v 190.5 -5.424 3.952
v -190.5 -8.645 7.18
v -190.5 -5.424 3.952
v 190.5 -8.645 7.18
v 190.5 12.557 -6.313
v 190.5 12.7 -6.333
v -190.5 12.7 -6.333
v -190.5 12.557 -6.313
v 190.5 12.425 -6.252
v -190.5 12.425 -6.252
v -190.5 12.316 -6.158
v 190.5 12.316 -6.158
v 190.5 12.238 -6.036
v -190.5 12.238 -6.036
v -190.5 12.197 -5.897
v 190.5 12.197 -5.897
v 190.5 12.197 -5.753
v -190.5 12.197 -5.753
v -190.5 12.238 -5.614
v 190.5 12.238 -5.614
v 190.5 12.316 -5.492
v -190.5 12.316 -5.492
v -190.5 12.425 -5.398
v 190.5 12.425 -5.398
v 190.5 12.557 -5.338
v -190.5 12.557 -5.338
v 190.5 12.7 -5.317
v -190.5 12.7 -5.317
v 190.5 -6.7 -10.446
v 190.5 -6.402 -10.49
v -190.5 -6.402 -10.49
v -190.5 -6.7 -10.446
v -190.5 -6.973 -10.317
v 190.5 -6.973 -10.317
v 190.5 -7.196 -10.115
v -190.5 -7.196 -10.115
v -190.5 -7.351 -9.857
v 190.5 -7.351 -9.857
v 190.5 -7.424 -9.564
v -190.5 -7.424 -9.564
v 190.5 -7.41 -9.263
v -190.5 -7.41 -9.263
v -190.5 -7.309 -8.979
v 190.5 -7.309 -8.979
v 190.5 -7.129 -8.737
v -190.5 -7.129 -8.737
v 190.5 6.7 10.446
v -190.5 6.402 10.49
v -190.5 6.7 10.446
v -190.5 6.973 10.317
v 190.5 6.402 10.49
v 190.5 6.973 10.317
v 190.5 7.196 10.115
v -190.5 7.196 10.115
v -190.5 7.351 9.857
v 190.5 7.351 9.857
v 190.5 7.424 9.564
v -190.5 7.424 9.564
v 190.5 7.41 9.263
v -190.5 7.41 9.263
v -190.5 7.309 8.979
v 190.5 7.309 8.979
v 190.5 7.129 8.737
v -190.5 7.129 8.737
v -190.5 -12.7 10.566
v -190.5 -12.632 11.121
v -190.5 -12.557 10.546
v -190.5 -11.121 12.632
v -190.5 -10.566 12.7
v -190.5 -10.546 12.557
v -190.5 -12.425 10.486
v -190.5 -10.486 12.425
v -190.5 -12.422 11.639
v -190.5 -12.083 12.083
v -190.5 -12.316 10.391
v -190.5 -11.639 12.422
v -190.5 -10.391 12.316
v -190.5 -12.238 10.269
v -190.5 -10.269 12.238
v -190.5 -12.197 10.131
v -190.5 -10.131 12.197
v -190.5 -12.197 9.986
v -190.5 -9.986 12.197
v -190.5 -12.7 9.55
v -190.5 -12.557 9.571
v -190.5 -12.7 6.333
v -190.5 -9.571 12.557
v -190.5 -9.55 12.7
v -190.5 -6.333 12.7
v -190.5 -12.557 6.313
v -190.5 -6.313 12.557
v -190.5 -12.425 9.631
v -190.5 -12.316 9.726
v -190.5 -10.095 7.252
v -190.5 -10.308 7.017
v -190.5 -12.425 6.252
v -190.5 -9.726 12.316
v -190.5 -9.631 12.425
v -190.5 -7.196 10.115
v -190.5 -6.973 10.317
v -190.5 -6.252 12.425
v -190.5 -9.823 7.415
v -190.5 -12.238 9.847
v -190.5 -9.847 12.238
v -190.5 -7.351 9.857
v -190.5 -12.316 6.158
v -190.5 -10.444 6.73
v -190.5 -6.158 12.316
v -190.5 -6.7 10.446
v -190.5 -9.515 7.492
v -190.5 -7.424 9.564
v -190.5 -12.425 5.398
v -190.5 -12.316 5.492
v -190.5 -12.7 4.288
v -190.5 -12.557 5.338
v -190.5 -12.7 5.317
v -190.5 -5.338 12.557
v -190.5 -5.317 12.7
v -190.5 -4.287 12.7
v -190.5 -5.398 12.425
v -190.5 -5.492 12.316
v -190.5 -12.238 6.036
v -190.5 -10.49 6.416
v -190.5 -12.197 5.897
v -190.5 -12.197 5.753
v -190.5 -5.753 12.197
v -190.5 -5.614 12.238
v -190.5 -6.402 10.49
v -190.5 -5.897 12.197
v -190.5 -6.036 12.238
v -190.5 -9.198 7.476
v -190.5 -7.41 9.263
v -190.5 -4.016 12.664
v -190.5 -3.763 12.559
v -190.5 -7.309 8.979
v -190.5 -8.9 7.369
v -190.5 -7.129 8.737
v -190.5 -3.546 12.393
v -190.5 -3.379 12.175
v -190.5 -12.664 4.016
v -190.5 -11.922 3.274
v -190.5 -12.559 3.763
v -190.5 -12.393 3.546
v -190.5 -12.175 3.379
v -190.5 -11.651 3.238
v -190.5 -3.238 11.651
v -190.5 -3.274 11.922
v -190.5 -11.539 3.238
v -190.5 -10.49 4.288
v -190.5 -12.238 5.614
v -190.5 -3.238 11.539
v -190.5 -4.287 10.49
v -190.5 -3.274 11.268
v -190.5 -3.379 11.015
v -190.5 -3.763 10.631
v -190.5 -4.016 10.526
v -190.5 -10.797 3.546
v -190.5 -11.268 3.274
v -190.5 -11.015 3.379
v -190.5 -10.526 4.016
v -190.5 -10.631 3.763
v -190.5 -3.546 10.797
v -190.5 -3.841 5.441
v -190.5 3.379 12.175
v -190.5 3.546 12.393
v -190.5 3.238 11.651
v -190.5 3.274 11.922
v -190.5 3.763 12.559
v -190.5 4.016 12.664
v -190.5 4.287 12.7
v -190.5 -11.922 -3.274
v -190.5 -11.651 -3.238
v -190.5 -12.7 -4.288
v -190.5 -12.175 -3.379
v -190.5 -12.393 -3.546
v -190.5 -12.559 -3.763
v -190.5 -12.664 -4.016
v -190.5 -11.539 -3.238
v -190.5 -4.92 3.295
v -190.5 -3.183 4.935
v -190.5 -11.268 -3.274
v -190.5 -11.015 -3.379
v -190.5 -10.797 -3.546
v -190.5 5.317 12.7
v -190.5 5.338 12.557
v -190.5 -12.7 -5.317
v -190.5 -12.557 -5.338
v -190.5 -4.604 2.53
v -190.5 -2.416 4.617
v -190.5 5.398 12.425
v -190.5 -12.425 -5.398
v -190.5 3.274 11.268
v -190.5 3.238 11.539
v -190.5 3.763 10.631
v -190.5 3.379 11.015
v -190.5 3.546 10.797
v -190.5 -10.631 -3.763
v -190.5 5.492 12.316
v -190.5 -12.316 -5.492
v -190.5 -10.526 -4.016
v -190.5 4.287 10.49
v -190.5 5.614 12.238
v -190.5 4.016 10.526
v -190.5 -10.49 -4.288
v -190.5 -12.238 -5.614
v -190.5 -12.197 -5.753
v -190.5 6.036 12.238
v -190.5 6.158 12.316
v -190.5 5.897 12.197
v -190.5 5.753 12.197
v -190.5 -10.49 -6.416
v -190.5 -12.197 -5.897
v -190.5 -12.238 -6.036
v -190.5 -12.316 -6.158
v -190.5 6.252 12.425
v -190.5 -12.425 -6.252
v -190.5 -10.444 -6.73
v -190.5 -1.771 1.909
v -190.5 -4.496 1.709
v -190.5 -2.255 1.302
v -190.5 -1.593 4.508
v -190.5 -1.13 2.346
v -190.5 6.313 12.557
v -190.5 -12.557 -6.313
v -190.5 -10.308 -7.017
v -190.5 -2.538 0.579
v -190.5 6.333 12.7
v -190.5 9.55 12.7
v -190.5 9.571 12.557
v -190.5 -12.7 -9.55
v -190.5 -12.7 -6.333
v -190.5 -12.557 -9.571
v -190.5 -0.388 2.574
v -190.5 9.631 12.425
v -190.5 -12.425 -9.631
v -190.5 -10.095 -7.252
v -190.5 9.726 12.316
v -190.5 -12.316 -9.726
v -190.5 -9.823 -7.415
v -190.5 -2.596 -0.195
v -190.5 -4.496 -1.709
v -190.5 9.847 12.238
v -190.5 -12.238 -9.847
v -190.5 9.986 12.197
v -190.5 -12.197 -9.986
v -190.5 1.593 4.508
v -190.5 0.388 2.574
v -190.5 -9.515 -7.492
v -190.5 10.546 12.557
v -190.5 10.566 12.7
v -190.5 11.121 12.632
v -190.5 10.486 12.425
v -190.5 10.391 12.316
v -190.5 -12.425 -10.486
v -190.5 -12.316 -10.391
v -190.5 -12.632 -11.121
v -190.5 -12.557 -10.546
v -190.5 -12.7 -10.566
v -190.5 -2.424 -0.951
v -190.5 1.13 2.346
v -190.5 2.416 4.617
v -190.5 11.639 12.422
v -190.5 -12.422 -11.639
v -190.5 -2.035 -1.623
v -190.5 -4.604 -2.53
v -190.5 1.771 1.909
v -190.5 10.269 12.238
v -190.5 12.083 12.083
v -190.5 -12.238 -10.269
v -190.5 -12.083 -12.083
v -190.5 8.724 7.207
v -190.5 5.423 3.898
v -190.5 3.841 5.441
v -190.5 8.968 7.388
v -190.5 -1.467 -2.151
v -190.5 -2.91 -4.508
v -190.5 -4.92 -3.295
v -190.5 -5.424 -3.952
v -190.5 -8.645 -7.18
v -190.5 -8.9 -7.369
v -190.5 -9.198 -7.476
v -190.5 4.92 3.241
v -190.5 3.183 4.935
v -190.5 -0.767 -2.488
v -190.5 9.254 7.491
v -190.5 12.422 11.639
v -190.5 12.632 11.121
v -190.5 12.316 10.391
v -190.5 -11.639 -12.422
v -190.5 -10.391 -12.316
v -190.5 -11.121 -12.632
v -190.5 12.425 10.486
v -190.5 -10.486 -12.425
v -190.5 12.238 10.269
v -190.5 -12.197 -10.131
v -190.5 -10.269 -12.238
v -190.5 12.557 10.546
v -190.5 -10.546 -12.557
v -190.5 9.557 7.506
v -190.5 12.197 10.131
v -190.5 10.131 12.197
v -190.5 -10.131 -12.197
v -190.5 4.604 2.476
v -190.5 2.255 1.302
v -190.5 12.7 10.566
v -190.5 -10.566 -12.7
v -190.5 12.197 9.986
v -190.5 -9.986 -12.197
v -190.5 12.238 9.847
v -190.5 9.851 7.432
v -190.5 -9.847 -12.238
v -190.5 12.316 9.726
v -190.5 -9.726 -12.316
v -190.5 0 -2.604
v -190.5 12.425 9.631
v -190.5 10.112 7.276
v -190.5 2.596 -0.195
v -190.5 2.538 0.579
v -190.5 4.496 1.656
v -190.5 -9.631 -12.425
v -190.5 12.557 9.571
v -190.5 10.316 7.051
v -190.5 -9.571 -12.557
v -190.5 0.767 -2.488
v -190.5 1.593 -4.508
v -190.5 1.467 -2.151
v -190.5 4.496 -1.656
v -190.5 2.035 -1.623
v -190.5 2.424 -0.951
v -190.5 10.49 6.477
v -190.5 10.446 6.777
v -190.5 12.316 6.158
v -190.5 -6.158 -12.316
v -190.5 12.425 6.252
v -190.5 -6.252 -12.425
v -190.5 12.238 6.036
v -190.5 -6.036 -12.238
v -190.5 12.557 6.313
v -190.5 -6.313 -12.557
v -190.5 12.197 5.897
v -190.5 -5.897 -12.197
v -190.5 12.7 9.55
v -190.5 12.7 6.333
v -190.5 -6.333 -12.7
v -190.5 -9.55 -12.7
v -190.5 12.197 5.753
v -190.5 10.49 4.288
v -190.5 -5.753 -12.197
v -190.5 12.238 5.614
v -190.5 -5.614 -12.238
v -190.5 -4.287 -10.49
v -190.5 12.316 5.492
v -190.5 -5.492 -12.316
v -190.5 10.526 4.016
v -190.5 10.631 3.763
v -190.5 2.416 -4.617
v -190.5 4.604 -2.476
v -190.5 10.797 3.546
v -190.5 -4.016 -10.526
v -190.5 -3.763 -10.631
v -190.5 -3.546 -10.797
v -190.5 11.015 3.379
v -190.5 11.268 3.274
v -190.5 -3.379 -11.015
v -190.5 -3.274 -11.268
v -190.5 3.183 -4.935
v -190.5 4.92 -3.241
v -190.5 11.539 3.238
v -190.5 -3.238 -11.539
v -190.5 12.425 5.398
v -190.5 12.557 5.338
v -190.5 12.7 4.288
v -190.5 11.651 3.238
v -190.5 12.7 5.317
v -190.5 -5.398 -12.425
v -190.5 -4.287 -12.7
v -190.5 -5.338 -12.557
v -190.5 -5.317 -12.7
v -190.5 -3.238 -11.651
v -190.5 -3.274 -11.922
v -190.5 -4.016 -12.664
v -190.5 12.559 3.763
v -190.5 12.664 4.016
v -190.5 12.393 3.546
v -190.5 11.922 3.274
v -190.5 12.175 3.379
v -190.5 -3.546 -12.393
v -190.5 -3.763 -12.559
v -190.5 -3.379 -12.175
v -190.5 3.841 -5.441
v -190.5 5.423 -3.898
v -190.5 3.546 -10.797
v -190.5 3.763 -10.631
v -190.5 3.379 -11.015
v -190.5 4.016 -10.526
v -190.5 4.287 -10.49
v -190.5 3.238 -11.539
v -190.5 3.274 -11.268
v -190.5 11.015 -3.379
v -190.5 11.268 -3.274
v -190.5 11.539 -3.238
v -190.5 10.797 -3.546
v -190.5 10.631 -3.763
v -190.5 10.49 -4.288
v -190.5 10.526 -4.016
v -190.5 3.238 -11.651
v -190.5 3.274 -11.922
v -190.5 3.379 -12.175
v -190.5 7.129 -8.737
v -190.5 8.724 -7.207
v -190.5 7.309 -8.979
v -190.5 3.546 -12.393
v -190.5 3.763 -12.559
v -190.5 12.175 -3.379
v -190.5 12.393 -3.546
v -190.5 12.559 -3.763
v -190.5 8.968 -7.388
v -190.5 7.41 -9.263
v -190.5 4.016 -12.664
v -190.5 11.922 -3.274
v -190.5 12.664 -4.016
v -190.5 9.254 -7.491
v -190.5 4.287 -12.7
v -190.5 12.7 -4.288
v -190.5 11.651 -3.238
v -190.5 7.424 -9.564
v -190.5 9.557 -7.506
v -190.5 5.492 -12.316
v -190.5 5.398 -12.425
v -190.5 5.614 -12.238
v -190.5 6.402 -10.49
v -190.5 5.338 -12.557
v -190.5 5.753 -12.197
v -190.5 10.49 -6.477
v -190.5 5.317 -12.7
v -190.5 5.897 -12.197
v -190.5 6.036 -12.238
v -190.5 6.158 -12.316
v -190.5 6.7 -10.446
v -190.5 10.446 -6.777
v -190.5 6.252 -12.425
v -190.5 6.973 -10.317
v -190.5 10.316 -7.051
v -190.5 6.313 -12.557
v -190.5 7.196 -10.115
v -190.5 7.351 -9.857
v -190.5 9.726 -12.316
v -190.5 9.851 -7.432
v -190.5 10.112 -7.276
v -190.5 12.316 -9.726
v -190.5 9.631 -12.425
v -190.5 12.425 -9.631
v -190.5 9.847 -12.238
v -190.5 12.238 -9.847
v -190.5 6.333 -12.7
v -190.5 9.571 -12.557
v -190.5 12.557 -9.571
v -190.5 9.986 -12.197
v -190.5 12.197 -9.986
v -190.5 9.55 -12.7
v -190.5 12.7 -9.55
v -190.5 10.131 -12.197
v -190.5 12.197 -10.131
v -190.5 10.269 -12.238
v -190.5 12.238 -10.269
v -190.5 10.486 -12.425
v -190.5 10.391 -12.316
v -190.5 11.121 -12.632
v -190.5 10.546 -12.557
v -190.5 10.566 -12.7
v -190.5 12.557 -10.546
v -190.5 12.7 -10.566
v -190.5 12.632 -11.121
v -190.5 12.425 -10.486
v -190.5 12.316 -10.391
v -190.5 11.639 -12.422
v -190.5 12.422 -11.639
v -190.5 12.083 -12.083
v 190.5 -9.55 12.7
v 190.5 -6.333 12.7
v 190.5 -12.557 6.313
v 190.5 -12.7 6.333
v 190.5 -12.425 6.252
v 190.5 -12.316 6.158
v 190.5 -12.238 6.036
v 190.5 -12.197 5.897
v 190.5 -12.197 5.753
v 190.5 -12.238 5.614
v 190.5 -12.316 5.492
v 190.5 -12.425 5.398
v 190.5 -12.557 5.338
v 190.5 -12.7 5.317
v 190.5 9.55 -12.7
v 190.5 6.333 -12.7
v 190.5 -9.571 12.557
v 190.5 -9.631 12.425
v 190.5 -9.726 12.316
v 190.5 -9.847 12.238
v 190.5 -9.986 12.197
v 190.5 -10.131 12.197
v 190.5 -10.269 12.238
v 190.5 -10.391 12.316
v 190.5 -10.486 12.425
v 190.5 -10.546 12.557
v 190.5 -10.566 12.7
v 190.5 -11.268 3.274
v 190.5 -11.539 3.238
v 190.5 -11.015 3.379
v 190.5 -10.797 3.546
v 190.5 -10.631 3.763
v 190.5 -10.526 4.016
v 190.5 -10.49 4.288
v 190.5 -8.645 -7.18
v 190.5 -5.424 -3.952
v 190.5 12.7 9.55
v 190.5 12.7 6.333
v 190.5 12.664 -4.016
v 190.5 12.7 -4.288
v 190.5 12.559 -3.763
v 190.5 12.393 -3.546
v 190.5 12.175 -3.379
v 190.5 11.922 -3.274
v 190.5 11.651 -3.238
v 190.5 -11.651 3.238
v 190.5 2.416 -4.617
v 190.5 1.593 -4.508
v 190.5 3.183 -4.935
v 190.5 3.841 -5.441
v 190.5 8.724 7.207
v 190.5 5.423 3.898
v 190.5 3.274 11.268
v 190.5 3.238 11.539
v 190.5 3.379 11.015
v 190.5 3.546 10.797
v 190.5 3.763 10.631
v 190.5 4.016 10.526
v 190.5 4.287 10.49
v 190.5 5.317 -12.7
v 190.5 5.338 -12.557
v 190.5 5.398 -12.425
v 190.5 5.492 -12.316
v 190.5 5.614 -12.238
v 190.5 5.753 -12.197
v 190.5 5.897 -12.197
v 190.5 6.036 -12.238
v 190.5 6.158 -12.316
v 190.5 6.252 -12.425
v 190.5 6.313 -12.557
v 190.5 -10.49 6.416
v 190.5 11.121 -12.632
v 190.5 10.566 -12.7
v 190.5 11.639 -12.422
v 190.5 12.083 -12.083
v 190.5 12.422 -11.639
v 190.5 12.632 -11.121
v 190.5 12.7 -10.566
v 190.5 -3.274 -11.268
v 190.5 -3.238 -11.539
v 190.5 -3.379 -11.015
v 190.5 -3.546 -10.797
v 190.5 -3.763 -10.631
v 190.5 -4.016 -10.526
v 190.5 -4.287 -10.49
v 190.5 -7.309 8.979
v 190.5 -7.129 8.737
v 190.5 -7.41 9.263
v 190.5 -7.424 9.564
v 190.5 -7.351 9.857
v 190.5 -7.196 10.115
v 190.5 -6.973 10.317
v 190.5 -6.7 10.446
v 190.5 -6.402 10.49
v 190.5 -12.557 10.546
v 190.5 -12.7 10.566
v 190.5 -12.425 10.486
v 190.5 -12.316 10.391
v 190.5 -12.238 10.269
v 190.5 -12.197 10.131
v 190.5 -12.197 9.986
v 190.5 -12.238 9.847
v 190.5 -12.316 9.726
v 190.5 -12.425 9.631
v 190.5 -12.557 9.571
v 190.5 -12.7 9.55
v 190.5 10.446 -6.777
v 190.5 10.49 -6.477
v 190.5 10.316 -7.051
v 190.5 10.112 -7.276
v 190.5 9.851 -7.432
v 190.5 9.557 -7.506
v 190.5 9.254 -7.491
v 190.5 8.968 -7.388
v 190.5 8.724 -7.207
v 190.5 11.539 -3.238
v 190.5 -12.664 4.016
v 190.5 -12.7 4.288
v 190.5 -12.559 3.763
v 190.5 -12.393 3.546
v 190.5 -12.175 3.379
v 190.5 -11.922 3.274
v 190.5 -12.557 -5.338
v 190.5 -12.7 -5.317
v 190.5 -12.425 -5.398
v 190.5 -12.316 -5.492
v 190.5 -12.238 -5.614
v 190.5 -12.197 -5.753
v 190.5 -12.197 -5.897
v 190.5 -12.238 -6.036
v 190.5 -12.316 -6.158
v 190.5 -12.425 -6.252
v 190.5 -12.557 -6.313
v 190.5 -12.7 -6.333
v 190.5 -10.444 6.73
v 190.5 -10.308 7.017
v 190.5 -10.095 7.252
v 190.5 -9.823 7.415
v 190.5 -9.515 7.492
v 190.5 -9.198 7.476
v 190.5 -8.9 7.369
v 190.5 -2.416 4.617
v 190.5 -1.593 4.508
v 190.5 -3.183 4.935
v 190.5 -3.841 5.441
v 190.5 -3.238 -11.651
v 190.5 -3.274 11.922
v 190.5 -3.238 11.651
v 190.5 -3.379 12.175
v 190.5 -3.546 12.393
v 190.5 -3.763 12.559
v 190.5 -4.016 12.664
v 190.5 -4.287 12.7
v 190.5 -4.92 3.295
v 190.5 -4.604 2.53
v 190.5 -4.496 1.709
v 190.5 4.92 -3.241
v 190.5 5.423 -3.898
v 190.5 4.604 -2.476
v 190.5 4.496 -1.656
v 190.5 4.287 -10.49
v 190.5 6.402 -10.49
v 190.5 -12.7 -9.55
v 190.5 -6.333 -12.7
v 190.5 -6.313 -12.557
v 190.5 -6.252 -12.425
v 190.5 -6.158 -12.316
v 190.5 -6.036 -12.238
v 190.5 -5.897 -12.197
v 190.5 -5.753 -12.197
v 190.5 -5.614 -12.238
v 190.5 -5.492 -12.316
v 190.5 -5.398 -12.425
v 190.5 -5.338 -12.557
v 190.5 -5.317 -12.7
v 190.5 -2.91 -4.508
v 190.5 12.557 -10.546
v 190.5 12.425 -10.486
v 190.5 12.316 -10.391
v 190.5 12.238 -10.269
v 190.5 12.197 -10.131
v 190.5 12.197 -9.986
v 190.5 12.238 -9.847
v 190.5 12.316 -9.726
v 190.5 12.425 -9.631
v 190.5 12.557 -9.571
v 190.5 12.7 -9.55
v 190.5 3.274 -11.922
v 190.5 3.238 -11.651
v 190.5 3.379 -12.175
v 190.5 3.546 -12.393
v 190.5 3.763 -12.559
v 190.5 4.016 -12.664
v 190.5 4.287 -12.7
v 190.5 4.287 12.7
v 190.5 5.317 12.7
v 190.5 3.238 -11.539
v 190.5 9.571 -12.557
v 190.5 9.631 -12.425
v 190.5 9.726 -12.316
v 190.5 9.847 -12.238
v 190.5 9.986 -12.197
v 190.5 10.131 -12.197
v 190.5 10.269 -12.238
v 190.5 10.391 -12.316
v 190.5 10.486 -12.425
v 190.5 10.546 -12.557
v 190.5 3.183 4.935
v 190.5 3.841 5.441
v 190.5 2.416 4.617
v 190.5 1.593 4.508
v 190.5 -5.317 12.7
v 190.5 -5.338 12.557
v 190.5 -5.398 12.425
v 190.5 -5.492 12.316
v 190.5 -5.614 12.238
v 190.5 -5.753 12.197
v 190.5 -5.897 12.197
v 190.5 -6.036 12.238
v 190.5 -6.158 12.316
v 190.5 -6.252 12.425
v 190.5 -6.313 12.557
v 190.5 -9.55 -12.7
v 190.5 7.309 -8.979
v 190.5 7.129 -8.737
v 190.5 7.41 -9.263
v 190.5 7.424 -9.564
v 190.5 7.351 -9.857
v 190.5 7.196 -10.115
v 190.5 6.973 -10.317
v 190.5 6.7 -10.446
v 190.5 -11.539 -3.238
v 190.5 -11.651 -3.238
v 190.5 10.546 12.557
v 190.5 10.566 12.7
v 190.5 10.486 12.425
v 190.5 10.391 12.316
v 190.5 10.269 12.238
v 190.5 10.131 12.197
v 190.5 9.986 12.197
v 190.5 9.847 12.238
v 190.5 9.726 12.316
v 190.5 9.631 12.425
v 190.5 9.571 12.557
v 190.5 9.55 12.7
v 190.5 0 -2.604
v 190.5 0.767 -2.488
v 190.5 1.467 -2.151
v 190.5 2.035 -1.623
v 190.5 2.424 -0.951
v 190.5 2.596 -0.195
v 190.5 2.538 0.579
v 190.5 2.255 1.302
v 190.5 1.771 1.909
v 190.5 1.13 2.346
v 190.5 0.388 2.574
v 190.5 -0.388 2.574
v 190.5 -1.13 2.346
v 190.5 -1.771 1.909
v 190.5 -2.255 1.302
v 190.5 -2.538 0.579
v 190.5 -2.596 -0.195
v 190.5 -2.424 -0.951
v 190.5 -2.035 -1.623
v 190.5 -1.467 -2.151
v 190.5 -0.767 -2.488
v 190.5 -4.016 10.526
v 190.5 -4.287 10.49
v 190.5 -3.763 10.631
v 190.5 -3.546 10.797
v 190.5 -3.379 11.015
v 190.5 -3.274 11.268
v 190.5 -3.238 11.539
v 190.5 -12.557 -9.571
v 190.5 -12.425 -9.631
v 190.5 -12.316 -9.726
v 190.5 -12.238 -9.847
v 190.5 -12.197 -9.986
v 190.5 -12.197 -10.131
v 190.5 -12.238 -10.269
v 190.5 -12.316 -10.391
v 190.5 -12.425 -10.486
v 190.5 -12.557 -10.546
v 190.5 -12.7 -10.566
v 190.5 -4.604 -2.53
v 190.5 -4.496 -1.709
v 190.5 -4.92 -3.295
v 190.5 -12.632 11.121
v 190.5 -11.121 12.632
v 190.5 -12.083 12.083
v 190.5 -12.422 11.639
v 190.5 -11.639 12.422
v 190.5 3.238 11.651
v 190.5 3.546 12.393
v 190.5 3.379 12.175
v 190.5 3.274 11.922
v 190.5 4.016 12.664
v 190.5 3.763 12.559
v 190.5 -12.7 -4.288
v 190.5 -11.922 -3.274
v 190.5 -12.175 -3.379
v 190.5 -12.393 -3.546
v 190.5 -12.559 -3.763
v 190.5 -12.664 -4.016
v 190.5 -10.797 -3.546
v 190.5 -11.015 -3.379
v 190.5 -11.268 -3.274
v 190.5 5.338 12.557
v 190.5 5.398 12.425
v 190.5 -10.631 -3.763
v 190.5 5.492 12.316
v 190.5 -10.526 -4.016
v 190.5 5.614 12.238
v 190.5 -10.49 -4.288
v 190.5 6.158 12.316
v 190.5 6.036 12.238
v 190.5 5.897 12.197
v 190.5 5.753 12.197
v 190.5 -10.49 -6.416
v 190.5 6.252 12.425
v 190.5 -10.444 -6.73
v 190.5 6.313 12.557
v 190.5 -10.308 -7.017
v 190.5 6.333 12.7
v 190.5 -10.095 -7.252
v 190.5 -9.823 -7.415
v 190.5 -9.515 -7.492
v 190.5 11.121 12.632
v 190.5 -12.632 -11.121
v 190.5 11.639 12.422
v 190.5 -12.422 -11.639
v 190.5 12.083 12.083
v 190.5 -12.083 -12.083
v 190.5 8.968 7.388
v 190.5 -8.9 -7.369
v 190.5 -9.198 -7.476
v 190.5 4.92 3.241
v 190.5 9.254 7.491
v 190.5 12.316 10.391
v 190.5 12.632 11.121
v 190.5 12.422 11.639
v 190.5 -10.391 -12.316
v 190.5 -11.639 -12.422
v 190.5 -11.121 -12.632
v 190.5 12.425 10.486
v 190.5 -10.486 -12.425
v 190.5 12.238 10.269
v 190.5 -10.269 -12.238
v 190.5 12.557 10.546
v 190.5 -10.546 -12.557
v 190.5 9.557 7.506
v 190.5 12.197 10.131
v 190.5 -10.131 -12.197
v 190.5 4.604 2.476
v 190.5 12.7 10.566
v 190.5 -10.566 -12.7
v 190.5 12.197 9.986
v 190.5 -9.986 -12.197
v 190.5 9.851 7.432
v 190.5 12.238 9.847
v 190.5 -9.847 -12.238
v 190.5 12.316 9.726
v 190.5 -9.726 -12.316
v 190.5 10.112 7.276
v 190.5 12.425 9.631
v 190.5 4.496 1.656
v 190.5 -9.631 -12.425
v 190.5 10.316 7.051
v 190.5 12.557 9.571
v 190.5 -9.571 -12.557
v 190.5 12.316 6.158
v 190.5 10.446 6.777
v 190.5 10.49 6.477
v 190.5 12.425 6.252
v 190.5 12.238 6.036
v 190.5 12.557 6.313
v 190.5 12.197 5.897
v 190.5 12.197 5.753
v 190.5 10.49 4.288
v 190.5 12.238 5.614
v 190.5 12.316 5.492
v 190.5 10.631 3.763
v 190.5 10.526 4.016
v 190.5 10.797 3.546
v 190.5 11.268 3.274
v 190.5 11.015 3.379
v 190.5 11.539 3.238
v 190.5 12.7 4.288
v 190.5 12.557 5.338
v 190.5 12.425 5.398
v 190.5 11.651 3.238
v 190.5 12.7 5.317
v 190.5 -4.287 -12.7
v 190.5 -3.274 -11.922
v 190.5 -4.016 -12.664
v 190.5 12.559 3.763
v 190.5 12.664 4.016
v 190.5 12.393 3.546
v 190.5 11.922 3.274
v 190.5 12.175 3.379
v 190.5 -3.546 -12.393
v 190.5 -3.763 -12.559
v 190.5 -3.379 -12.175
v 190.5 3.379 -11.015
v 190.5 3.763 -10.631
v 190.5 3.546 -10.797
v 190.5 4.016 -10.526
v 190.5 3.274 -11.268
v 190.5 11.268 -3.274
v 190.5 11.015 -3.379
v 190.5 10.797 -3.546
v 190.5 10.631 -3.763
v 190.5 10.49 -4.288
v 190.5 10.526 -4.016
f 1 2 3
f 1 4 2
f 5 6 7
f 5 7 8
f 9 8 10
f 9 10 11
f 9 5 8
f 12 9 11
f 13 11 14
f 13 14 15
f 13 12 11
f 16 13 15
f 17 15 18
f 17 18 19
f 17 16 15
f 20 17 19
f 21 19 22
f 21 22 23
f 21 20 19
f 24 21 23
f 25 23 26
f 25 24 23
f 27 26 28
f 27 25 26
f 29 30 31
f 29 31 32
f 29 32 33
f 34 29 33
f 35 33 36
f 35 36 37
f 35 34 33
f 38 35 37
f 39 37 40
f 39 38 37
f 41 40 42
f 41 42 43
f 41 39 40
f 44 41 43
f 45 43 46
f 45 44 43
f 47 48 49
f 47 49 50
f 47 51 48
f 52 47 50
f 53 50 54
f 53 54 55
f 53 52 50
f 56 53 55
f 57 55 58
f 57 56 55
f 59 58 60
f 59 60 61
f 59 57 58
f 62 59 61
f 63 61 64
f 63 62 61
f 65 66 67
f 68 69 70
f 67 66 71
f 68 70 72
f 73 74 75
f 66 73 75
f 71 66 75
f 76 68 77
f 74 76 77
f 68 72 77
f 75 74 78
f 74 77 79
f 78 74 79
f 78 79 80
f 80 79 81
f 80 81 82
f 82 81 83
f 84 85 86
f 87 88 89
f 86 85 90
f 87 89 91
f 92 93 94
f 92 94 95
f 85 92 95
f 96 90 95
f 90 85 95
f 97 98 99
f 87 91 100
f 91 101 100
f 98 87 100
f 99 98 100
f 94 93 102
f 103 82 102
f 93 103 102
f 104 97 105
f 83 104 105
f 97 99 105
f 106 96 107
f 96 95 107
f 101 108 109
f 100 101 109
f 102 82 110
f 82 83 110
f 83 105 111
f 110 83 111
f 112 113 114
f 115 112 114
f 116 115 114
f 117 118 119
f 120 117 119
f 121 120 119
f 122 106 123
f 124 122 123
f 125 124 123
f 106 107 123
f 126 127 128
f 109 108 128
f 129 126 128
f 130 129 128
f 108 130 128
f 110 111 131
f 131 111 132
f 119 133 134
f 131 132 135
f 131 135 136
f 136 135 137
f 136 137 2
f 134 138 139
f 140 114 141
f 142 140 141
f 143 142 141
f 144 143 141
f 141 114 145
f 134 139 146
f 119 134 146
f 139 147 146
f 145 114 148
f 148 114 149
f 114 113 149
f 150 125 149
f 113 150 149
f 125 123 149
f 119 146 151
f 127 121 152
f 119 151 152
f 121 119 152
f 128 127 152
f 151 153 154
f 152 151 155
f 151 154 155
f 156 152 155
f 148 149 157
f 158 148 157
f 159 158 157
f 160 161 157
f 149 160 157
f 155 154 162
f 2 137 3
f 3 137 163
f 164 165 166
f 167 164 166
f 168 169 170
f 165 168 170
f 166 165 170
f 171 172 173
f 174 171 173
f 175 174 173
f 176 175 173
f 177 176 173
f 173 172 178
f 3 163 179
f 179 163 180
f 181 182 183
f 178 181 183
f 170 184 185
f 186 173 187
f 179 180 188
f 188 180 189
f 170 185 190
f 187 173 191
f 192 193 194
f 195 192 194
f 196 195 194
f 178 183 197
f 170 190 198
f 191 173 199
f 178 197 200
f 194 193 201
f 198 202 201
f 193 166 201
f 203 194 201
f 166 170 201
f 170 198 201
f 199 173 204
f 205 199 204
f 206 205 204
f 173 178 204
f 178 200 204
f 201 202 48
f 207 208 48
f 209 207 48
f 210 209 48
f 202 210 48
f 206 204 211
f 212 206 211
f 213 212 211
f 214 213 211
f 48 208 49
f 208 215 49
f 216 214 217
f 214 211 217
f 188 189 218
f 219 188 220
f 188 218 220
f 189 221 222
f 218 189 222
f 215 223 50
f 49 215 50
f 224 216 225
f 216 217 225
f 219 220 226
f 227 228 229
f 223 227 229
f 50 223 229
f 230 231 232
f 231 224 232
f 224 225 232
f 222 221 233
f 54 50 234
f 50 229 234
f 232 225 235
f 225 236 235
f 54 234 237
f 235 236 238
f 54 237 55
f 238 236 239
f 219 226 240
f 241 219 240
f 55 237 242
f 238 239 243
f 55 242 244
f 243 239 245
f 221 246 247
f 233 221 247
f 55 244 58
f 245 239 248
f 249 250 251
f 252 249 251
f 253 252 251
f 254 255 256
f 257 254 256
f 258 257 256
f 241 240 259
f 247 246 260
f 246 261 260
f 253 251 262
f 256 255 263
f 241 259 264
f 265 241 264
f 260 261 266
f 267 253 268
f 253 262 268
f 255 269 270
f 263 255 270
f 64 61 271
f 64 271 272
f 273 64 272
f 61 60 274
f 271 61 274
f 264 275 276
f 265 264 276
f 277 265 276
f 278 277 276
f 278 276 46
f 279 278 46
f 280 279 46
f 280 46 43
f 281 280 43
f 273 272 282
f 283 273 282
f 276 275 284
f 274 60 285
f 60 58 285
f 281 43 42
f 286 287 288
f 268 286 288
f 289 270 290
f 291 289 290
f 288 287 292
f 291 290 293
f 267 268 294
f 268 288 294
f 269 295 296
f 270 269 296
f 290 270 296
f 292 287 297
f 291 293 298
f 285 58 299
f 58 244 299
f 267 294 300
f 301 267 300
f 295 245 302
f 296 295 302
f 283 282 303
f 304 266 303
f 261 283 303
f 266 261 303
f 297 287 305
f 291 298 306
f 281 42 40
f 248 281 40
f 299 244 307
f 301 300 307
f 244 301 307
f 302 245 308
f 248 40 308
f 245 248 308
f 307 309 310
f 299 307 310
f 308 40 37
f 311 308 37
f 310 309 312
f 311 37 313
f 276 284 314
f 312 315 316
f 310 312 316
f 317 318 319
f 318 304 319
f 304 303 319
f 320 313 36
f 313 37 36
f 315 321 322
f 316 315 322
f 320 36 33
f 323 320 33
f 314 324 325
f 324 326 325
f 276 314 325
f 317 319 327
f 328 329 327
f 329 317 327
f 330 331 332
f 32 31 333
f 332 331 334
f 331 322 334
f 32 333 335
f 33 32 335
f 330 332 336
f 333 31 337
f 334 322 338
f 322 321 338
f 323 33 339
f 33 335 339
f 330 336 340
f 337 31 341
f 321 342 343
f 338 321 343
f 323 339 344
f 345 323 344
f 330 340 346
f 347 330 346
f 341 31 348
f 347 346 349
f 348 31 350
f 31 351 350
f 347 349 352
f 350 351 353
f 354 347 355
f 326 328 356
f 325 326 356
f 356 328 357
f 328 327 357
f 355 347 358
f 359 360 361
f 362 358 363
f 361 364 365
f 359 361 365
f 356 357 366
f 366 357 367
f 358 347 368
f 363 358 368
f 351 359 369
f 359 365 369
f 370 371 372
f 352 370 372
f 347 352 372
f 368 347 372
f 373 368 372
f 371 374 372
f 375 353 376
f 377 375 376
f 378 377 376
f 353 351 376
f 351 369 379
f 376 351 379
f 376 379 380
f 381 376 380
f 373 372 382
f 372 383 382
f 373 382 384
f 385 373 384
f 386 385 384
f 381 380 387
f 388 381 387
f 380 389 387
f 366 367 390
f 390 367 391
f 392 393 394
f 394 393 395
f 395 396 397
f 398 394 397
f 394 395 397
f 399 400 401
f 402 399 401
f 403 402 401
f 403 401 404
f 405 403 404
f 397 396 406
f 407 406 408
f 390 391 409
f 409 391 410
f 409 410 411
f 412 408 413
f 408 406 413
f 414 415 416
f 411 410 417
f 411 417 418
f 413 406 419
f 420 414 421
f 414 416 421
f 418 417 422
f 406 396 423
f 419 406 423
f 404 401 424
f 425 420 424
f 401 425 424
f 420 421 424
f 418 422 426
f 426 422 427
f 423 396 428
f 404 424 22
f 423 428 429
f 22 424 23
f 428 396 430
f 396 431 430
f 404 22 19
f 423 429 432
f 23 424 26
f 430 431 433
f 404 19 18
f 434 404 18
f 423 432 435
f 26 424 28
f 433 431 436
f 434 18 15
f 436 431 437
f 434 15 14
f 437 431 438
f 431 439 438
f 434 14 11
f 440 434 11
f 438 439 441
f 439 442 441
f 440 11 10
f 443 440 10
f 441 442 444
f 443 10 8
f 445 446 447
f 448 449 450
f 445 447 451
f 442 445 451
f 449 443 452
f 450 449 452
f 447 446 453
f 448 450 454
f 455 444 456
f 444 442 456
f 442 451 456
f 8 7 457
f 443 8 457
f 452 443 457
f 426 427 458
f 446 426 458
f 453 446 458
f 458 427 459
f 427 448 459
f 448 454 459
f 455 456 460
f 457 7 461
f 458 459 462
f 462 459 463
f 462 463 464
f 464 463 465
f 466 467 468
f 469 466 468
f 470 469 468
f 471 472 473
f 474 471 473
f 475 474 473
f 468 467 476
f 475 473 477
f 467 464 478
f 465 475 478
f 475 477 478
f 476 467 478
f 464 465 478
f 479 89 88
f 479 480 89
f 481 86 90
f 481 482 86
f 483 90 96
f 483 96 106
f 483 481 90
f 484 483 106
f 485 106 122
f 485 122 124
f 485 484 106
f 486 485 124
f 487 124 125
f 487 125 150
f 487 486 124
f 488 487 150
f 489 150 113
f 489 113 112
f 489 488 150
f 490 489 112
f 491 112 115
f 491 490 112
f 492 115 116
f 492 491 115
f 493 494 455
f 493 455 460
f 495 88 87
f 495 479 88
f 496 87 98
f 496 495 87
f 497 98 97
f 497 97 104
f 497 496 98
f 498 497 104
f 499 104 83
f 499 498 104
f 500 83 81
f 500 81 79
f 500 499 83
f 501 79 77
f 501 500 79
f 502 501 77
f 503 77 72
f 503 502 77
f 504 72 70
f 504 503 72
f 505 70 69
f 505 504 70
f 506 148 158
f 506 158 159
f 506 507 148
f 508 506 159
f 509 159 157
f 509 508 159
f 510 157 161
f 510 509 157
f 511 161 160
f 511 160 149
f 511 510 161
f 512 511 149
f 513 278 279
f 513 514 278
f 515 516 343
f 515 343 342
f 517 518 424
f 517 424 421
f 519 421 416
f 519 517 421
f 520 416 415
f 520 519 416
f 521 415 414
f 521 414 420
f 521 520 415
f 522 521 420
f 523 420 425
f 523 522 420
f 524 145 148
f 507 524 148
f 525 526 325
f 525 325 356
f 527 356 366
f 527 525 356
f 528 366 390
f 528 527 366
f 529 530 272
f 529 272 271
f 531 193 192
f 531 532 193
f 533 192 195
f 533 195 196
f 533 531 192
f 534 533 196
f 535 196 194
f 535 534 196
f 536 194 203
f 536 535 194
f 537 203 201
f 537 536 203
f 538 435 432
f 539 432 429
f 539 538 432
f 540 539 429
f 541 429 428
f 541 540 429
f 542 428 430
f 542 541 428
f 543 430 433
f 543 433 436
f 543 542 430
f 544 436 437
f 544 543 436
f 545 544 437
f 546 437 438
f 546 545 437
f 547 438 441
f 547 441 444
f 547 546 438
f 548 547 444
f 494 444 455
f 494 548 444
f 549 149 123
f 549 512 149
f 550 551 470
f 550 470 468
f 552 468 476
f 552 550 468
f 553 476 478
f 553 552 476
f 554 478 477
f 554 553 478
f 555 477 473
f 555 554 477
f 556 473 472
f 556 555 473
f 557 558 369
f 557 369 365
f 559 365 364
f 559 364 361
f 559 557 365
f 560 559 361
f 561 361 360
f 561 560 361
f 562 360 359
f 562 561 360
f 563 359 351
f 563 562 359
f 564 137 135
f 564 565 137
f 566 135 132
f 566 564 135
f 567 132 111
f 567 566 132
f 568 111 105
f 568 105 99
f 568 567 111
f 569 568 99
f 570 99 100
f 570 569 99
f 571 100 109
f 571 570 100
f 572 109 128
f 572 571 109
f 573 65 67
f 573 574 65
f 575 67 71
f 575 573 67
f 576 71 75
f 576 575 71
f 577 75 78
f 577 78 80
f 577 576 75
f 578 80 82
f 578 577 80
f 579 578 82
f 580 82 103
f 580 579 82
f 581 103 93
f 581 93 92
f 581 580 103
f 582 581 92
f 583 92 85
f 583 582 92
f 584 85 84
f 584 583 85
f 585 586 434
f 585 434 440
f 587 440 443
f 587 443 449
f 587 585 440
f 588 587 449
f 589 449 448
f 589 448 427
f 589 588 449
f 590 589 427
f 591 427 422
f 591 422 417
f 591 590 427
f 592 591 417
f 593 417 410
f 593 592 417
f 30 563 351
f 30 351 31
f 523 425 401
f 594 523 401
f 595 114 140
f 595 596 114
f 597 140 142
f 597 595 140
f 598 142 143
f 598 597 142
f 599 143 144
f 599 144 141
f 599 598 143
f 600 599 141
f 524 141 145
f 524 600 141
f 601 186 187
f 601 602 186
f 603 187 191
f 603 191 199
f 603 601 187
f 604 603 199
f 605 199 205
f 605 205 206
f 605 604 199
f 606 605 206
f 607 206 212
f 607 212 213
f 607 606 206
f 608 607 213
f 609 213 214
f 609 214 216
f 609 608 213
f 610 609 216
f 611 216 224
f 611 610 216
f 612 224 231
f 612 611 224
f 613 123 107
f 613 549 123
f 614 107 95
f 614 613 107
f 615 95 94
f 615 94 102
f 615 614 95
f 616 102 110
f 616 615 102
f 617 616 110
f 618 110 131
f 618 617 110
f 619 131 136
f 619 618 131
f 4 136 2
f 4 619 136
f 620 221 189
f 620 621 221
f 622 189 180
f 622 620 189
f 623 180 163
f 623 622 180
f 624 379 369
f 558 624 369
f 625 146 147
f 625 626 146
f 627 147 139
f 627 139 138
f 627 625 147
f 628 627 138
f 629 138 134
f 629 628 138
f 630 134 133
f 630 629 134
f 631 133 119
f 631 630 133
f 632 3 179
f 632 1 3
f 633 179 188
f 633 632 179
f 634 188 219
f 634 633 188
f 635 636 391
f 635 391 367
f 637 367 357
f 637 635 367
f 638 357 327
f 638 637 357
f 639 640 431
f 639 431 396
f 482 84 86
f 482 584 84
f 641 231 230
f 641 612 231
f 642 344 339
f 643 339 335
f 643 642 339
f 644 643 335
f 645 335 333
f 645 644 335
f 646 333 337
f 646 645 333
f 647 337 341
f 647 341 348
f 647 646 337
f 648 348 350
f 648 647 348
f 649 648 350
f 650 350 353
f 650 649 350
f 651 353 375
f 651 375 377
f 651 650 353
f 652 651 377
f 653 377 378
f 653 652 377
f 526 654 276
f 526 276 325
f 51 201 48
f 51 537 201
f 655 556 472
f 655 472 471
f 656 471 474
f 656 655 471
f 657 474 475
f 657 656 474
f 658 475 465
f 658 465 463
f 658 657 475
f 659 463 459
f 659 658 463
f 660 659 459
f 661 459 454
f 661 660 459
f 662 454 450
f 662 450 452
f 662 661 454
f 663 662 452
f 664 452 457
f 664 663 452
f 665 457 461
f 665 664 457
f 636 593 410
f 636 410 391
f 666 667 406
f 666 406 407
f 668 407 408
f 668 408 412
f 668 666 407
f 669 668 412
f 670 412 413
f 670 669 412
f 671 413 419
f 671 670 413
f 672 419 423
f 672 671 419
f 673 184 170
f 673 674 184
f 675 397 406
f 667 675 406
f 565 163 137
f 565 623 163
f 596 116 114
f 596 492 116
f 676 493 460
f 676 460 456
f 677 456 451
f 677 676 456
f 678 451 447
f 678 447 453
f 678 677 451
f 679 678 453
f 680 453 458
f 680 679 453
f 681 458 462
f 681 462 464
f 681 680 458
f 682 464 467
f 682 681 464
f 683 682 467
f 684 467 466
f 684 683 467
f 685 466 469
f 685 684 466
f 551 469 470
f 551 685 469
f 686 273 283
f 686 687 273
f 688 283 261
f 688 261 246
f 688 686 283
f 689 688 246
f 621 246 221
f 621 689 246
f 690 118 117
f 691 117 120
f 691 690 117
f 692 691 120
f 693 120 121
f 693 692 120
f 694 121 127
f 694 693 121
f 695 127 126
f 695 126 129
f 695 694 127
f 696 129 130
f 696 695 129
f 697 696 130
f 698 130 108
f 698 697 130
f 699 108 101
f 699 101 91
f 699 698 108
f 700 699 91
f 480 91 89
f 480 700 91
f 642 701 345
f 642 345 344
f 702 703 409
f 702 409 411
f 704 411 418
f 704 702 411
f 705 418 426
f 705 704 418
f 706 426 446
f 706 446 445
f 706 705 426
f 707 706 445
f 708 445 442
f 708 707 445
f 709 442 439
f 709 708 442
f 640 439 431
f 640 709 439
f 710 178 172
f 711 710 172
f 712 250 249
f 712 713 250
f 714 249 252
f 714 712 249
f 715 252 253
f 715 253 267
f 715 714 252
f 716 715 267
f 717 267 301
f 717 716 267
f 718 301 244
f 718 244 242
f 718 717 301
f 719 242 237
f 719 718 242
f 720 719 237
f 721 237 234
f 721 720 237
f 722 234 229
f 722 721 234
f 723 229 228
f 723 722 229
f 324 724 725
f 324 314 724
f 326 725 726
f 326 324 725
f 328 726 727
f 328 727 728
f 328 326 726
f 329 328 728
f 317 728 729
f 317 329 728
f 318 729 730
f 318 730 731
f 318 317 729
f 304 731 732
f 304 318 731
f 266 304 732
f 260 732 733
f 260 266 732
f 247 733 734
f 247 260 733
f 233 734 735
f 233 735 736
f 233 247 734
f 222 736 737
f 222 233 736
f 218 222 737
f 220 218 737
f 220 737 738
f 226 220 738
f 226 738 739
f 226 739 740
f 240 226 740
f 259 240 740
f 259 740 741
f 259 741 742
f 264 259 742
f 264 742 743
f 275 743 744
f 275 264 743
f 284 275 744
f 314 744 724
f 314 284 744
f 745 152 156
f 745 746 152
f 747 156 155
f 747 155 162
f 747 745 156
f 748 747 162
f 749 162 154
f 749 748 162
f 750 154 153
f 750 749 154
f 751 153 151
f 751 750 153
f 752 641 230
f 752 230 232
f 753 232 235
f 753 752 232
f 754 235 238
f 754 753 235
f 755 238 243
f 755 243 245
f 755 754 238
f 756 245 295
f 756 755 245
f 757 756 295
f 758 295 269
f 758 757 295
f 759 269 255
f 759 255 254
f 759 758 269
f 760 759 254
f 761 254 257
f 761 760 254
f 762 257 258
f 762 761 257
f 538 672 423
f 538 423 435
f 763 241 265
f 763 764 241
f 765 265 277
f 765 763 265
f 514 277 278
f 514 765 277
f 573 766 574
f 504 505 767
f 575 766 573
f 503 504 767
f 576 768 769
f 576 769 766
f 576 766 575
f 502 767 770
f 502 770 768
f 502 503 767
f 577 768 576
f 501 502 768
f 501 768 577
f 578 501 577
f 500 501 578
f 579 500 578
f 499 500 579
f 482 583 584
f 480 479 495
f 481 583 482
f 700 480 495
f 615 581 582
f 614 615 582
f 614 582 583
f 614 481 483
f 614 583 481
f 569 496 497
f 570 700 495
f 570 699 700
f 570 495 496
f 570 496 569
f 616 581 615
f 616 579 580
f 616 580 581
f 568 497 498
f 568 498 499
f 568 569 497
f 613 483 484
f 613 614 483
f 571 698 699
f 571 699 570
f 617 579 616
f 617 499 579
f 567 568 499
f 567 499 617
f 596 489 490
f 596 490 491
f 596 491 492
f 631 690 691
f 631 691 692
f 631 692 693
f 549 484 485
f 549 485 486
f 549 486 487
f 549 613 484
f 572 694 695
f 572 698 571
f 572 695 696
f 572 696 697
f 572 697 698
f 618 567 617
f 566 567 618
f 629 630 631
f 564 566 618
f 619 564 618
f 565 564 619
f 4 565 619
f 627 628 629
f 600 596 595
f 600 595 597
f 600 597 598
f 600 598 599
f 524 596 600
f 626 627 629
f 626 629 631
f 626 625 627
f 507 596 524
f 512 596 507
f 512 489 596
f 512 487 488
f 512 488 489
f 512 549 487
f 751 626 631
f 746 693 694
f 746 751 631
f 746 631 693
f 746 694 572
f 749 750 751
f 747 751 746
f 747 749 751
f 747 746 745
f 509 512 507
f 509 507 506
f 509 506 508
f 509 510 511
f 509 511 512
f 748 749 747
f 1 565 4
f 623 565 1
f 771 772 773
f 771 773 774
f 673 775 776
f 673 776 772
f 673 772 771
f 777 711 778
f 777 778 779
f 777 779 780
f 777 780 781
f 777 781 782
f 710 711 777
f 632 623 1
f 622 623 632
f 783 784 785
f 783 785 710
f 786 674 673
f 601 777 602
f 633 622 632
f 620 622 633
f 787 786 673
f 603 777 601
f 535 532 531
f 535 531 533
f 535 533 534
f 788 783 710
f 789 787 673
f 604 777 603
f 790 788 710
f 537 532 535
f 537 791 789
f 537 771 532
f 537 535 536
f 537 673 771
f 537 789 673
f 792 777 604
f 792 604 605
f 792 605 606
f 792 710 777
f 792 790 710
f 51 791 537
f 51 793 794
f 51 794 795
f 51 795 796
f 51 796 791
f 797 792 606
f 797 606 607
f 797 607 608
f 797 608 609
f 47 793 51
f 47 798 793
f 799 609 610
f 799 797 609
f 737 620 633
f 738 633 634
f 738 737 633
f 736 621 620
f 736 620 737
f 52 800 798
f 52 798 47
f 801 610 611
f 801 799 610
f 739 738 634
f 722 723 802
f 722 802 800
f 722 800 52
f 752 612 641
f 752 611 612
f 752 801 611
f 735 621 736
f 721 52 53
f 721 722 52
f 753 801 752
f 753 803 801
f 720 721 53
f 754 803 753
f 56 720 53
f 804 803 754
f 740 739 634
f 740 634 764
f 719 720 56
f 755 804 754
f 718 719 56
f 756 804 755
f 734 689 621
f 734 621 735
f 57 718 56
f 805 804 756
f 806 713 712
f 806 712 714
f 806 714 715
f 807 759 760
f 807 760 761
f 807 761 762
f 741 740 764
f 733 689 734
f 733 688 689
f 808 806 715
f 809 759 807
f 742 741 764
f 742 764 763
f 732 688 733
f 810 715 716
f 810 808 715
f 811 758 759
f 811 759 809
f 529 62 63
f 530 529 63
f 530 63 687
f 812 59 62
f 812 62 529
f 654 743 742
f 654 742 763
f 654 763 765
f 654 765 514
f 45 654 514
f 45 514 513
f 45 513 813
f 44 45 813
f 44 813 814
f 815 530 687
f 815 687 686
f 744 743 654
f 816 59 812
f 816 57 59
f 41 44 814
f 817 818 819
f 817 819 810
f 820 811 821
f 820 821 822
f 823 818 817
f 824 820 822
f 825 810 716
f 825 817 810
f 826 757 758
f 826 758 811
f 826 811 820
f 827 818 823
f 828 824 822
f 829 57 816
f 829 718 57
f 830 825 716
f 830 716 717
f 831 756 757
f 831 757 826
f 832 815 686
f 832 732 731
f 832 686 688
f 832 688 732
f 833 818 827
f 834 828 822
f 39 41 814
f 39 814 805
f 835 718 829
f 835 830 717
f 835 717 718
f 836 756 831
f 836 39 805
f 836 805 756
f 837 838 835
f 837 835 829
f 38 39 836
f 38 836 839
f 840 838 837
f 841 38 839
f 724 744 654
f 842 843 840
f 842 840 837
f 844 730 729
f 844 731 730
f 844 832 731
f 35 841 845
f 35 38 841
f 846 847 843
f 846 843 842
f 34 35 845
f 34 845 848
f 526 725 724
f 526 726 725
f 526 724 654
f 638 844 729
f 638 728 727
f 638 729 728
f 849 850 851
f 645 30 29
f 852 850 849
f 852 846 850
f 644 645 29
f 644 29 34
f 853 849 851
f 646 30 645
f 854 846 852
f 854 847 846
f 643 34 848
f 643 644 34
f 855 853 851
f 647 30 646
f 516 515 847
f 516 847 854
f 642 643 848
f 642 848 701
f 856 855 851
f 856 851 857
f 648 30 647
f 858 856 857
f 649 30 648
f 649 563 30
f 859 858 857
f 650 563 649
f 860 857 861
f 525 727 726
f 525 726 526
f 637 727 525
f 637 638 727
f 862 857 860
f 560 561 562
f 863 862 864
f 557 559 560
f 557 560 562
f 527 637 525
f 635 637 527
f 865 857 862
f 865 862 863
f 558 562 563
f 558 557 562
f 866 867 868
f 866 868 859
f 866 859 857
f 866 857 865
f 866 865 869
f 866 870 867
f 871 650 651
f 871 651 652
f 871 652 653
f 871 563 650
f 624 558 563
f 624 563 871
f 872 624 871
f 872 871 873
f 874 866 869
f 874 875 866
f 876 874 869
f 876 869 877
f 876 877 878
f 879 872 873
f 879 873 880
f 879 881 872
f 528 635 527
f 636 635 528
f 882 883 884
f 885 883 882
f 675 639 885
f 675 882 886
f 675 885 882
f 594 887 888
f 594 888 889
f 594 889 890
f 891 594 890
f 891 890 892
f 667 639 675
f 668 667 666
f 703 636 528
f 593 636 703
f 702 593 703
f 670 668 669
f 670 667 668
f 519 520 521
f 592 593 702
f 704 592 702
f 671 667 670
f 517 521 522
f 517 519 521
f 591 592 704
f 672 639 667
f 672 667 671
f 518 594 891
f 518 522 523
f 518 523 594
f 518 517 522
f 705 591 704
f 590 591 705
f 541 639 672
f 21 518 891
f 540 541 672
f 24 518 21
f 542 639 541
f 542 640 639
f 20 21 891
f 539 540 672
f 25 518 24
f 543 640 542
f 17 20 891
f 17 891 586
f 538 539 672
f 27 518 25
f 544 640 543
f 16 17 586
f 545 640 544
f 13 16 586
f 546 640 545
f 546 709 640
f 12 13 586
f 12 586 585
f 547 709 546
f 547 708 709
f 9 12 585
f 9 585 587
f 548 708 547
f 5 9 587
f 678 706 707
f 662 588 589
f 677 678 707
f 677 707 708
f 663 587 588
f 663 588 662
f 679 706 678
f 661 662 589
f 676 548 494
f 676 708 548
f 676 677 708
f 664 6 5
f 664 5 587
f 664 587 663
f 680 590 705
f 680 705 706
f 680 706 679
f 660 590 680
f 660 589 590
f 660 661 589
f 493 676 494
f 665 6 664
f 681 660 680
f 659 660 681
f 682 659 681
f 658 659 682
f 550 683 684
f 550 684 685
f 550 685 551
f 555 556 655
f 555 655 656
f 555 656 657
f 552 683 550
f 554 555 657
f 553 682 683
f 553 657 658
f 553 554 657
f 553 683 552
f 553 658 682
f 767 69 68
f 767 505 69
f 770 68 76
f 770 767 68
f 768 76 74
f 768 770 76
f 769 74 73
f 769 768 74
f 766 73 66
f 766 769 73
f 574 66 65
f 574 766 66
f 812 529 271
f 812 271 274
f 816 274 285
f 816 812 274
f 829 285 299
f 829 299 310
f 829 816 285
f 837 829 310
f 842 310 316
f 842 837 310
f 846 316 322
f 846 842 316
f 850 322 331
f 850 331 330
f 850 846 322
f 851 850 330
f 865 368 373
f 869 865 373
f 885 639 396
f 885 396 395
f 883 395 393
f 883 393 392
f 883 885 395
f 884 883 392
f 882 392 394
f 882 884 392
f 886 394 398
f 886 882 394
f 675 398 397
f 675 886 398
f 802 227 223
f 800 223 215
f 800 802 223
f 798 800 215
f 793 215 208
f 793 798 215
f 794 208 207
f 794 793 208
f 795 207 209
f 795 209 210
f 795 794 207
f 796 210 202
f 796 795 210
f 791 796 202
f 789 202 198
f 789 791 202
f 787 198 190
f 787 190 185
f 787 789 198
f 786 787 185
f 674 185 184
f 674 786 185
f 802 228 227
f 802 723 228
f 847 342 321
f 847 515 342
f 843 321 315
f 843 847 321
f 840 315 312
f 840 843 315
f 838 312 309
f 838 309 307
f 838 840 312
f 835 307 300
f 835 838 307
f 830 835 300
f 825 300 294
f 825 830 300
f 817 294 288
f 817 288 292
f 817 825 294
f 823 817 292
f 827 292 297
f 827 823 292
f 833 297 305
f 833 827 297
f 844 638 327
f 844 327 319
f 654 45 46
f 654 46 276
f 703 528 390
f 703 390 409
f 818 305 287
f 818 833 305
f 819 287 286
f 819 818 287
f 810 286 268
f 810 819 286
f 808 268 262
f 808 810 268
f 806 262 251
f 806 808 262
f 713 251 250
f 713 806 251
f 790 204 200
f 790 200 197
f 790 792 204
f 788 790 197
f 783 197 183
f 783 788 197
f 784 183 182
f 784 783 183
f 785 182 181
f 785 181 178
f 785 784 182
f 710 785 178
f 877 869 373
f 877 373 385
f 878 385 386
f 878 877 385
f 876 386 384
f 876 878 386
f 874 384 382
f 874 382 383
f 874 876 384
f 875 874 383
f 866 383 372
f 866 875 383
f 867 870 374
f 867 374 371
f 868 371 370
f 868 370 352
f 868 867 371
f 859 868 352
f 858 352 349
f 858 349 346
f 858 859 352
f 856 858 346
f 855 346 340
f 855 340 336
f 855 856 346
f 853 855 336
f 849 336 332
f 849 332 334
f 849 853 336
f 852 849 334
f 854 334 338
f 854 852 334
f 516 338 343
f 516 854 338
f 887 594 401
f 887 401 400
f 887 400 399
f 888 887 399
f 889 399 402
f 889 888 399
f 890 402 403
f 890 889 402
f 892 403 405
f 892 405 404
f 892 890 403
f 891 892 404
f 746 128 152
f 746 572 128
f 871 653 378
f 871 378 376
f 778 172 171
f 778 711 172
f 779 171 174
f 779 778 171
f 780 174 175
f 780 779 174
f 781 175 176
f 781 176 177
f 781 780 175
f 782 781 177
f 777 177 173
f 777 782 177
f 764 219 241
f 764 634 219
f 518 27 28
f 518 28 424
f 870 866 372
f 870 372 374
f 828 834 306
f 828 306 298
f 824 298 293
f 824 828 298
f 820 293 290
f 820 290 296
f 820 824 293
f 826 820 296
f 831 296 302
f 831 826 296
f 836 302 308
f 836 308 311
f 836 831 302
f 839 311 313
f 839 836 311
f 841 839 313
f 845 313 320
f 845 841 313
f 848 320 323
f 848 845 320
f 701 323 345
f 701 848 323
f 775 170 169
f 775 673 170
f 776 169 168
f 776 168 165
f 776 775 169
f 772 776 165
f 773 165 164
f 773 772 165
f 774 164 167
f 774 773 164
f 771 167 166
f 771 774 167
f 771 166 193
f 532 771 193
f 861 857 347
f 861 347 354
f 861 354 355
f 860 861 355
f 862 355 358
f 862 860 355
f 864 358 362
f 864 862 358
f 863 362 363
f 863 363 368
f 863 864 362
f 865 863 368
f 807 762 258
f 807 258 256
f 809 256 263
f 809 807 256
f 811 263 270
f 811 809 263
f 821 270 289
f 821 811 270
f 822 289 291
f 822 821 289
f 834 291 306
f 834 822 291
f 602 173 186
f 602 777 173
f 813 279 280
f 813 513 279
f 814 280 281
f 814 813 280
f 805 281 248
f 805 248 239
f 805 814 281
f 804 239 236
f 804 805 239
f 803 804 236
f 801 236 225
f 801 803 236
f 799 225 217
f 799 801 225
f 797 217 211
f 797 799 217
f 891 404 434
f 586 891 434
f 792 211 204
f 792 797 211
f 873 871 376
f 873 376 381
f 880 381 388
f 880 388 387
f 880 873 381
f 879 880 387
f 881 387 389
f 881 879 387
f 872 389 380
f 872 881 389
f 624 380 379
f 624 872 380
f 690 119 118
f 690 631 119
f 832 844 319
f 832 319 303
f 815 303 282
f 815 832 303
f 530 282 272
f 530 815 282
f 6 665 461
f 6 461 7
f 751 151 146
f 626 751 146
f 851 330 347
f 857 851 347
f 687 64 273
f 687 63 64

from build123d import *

# Parameters (mm, degrees)
SKETCH1_R           = 2.6035
BOSS_EXTRUDE1_DEPTH = 190.5


with BuildPart() as part:
    # Sketch1 → Boss-Extrude1 (new body, symmetric)
    with BuildSketch(Plane(origin=(0, 0, 0), x_dir=(0, 0, -1), z_dir=(1, 0, 0))):
        with BuildLine():
            Line((6.333126718, -12.7), (9.550443118, -12.7))
            ThreePointArc((9.550443118, -12.7), (10.058366869, -12.192000006), (10.566443095, -12.699847501))
            ThreePointArc((10.566443095, -12.699847501), (12.082537762, -12.08250727), (12.699846982, -10.566399977))
            ThreePointArc((12.699846982, -10.566399977), (12.192000006, -10.058323491), (12.7, -9.5504))
            Line((12.7, -9.5504), (12.7, -6.3330836))
            ThreePointArc((12.7, -6.3330836), (12.192, -5.8250836), (12.7, -5.3170836))
            Line((12.7, -5.3170836), (12.7, -4.287469289))
            ThreePointArc((12.7, -4.287469289), (12.39275138, -3.545705502), (11.650987593, -3.238456882))
            Line((11.650987593, -3.238456882), (11.539212407, -3.238456882))
            ThreePointArc((11.539212407, -3.238456882), (10.79744862, -3.545705502), (10.4902, -4.287469289))
            Line((10.4902, -4.287469289), (10.4902, -6.402089023))
            ThreePointArc((10.4902, -6.402089023), (9.856505071, -7.351067942), (8.737131347, -7.129408934))
            Line((8.737131347, -7.129408934), (4.5085, -2.9104418))
            Line((4.5085, -2.9104418), (4.5085, 1.593185507))
            ThreePointArc((4.5085, 1.593185507), (4.750877967, 2.809883091), (5.441005833, 3.840816462))
            Line((5.441005833, 3.840816462), (8.737131347, 7.129408934))
            ThreePointArc((8.737131347, 7.129408934), (9.856505071, 7.351067942), (10.4902, 6.402089023))
            Line((10.4902, 6.402089023), (10.4902, 4.287469289))
            ThreePointArc((10.4902, 4.287469289), (10.79744862, 3.545705502), (11.539212407, 3.238456882))
            Line((11.539212407, 3.238456882), (11.650987593, 3.238456882))
            ThreePointArc((11.650987593, 3.238456882), (12.39275138, 3.545705502), (12.7, 4.287469289))
            Line((12.7, 4.287469289), (12.7, 5.3170836))
            ThreePointArc((12.7, 5.3170836), (12.192, 5.8250836), (12.7, 6.3330836))
            Line((12.7, 6.3330836), (12.7, 9.5504))
            ThreePointArc((12.7, 9.5504), (12.192000006, 10.058323491), (12.699846982, 10.566399977))
            ThreePointArc((12.699846982, 10.566399977), (12.082537762, 12.08250727), (10.566443095, 12.699847501))
            ThreePointArc((10.566443095, 12.699847501), (10.058366869, 12.192000006), (9.550443118, 12.7))
            Line((9.550443118, 12.7), (6.333126718, 12.7))
            ThreePointArc((6.333126718, 12.7), (5.825126718, 12.192), (5.317126718, 12.7))
            Line((5.317126718, 12.7), (4.287512407, 12.7))
            ThreePointArc((4.287512407, 12.7), (3.54574862, 12.39275138), (3.2385, 11.650987593))
            Line((3.2385, 11.650987593), (3.2385, 11.539212407))
            ThreePointArc((3.2385, 11.539212407), (3.54574862, 10.79744862), (4.287512407, 10.4902))
            Line((4.287512407, 10.4902), (6.476788598, 10.4902))
            ThreePointArc((6.476788598, 10.4902), (7.432222385, 9.85140422), (7.207036008, 8.724370562))
            Line((7.207036008, 8.724370562), (3.898272566, 5.423169045))
            ThreePointArc((3.898272566, 5.423169045), (2.869120213, 4.736787962), (1.655778399, 4.4958))
            Line((1.655778399, 4.4958), (-1.655778399, 4.4958))
            ThreePointArc((-1.655778399, 4.4958), (-2.869120213, 4.736787962), (-3.898272566, 5.423169045))
            Line((-3.898272566, 5.423169045), (-7.207036008, 8.724370562))
            ThreePointArc((-7.207036008, 8.724370562), (-7.432222385, 9.85140422), (-6.476788598, 10.4902))
            Line((-6.476788598, 10.4902), (-4.287512407, 10.4902))
            ThreePointArc((-4.287512407, 10.4902), (-3.54574862, 10.79744862), (-3.2385, 11.539212407))
            Line((-3.2385, 11.539212407), (-3.2385, 11.650987593))
            ThreePointArc((-3.2385, 11.650987593), (-3.54574862, 12.39275138), (-4.287512407, 12.7))
            Line((-4.287512407, 12.7), (-5.317126718, 12.7))
            ThreePointArc((-5.317126718, 12.7), (-5.825126718, 12.192), (-6.333126718, 12.7))
            Line((-6.333126718, 12.7), (-9.550443118, 12.7))
            ThreePointArc((-9.550443118, 12.7), (-10.058366869, 12.192000006), (-10.566443095, 12.699847501))
            ThreePointArc((-10.566443095, 12.699847501), (-12.082537762, 12.08250727), (-12.699846982, 10.566399977))
            ThreePointArc((-12.699846982, 10.566399977), (-12.192000006, 10.058323491), (-12.7, 9.5504))
            Line((-12.7, 9.5504), (-12.7, 6.3330836))
            ThreePointArc((-12.7, 6.3330836), (-12.192, 5.8250836), (-12.7, 5.3170836))
            Line((-12.7, 5.3170836), (-12.7, 4.287469289))
            ThreePointArc((-12.7, 4.287469289), (-12.39275138, 3.545705502), (-11.650987593, 3.238456882))
            Line((-11.650987593, 3.238456882), (-11.539212407, 3.238456882))
            ThreePointArc((-11.539212407, 3.238456882), (-10.79744862, 3.545705502), (-10.4902, 4.287469289))
            Line((-10.4902, 4.287469289), (-10.4902, 6.402089023))
            ThreePointArc((-10.4902, 6.402089023), (-9.856505071, 7.351067942), (-8.737131347, 7.129408934))
            Line((-8.737131347, 7.129408934), (-5.441005833, 3.840816462))
            ThreePointArc((-5.441005833, 3.840816462), (-4.750877967, 2.809883091), (-4.5085, 1.593185507))
            Line((-4.5085, 1.593185507), (-4.5085, -1.593185507))
            ThreePointArc((-4.5085, -1.593185507), (-4.750877967, -2.809883091), (-5.441005833, -3.840816462))
            Line((-5.441005833, -3.840816462), (-8.737131347, -7.129408934))
            ThreePointArc((-8.737131347, -7.129408934), (-9.856505071, -7.351067942), (-10.4902, -6.402089023))
            Line((-10.4902, -6.402089023), (-10.4902, -4.287469289))
            ThreePointArc((-10.4902, -4.287469289), (-10.79744862, -3.545705502), (-11.539212407, -3.238456882))
            Line((-11.539212407, -3.238456882), (-11.650987593, -3.238456882))
            ThreePointArc((-11.650987593, -3.238456882), (-12.39275138, -3.545705502), (-12.7, -4.287469289))
            Line((-12.7, -4.287469289), (-12.7, -5.3170836))
            ThreePointArc((-12.7, -5.3170836), (-12.192, -5.8250836), (-12.7, -6.3330836))
            Line((-12.7, -6.3330836), (-12.7, -9.5504))
            ThreePointArc((-12.7, -9.5504), (-12.192000006, -10.058323491), (-12.699846982, -10.566399977))
            ThreePointArc((-12.699846982, -10.566399977), (-12.082537762, -12.08250727), (-10.566443095, -12.699847501))
            ThreePointArc((-10.566443095, -12.699847501), (-10.058366869, -12.192000006), (-9.550443118, -12.7))
            Line((-9.550443118, -12.7), (-6.333126718, -12.7))
            ThreePointArc((-6.333126718, -12.7), (-5.825126718, -12.192), (-5.317126718, -12.7))
            Line((-5.317126718, -12.7), (-4.287512407, -12.7))
            ThreePointArc((-4.287512407, -12.7), (-3.54574862, -12.39275138), (-3.2385, -11.650987593))
            Line((-3.2385, -11.650987593), (-3.2385, -11.539212407))
            ThreePointArc((-3.2385, -11.539212407), (-3.54574862, -10.79744862), (-4.287512407, -10.4902))
            Line((-4.287512407, -10.4902), (-6.416408329, -10.4902))
            ThreePointArc((-6.416408329, -10.4902), (-7.41473083, -9.822813117), (-7.179650497, -8.645192506))
            Line((-7.179650497, -8.645192506), (-3.952270251, -5.423690499))
            ThreePointArc((-3.952270251, -5.423690499), (-2.922936451, -4.736929036), (-1.709253557, -4.4958))
            Line((-1.709253557, -4.4958), (1.709253557, -4.4958))
            ThreePointArc((1.709253557, -4.4958), (2.922936451, -4.736929036), (3.952270251, -5.423690499))
            Line((3.952270251, -5.423690499), (7.179650497, -8.645192506))
            ThreePointArc((7.179650497, -8.645192506), (7.41473083, -9.822813117), (6.416408329, -10.4902))
            Line((6.416408329, -10.4902), (4.287512407, -10.4902))
            ThreePointArc((4.287512407, -10.4902), (3.54574862, -10.79744862), (3.2385, -11.539212407))
            Line((3.2385, -11.539212407), (3.2385, -11.650987593))
            ThreePointArc((3.2385, -11.650987593), (3.54574862, -12.39275138), (4.287512407, -12.7))
            Line((4.287512407, -12.7), (5.317126718, -12.7))
            ThreePointArc((5.317126718, -12.7), (5.825126718, -12.192), (6.333126718, -12.7))
        make_face()
        Circle(SKETCH1_R, mode=Mode.SUBTRACT)
    extrude(amount=BOSS_EXTRUDE1_DEPTH, both=True)


solid = part.part
